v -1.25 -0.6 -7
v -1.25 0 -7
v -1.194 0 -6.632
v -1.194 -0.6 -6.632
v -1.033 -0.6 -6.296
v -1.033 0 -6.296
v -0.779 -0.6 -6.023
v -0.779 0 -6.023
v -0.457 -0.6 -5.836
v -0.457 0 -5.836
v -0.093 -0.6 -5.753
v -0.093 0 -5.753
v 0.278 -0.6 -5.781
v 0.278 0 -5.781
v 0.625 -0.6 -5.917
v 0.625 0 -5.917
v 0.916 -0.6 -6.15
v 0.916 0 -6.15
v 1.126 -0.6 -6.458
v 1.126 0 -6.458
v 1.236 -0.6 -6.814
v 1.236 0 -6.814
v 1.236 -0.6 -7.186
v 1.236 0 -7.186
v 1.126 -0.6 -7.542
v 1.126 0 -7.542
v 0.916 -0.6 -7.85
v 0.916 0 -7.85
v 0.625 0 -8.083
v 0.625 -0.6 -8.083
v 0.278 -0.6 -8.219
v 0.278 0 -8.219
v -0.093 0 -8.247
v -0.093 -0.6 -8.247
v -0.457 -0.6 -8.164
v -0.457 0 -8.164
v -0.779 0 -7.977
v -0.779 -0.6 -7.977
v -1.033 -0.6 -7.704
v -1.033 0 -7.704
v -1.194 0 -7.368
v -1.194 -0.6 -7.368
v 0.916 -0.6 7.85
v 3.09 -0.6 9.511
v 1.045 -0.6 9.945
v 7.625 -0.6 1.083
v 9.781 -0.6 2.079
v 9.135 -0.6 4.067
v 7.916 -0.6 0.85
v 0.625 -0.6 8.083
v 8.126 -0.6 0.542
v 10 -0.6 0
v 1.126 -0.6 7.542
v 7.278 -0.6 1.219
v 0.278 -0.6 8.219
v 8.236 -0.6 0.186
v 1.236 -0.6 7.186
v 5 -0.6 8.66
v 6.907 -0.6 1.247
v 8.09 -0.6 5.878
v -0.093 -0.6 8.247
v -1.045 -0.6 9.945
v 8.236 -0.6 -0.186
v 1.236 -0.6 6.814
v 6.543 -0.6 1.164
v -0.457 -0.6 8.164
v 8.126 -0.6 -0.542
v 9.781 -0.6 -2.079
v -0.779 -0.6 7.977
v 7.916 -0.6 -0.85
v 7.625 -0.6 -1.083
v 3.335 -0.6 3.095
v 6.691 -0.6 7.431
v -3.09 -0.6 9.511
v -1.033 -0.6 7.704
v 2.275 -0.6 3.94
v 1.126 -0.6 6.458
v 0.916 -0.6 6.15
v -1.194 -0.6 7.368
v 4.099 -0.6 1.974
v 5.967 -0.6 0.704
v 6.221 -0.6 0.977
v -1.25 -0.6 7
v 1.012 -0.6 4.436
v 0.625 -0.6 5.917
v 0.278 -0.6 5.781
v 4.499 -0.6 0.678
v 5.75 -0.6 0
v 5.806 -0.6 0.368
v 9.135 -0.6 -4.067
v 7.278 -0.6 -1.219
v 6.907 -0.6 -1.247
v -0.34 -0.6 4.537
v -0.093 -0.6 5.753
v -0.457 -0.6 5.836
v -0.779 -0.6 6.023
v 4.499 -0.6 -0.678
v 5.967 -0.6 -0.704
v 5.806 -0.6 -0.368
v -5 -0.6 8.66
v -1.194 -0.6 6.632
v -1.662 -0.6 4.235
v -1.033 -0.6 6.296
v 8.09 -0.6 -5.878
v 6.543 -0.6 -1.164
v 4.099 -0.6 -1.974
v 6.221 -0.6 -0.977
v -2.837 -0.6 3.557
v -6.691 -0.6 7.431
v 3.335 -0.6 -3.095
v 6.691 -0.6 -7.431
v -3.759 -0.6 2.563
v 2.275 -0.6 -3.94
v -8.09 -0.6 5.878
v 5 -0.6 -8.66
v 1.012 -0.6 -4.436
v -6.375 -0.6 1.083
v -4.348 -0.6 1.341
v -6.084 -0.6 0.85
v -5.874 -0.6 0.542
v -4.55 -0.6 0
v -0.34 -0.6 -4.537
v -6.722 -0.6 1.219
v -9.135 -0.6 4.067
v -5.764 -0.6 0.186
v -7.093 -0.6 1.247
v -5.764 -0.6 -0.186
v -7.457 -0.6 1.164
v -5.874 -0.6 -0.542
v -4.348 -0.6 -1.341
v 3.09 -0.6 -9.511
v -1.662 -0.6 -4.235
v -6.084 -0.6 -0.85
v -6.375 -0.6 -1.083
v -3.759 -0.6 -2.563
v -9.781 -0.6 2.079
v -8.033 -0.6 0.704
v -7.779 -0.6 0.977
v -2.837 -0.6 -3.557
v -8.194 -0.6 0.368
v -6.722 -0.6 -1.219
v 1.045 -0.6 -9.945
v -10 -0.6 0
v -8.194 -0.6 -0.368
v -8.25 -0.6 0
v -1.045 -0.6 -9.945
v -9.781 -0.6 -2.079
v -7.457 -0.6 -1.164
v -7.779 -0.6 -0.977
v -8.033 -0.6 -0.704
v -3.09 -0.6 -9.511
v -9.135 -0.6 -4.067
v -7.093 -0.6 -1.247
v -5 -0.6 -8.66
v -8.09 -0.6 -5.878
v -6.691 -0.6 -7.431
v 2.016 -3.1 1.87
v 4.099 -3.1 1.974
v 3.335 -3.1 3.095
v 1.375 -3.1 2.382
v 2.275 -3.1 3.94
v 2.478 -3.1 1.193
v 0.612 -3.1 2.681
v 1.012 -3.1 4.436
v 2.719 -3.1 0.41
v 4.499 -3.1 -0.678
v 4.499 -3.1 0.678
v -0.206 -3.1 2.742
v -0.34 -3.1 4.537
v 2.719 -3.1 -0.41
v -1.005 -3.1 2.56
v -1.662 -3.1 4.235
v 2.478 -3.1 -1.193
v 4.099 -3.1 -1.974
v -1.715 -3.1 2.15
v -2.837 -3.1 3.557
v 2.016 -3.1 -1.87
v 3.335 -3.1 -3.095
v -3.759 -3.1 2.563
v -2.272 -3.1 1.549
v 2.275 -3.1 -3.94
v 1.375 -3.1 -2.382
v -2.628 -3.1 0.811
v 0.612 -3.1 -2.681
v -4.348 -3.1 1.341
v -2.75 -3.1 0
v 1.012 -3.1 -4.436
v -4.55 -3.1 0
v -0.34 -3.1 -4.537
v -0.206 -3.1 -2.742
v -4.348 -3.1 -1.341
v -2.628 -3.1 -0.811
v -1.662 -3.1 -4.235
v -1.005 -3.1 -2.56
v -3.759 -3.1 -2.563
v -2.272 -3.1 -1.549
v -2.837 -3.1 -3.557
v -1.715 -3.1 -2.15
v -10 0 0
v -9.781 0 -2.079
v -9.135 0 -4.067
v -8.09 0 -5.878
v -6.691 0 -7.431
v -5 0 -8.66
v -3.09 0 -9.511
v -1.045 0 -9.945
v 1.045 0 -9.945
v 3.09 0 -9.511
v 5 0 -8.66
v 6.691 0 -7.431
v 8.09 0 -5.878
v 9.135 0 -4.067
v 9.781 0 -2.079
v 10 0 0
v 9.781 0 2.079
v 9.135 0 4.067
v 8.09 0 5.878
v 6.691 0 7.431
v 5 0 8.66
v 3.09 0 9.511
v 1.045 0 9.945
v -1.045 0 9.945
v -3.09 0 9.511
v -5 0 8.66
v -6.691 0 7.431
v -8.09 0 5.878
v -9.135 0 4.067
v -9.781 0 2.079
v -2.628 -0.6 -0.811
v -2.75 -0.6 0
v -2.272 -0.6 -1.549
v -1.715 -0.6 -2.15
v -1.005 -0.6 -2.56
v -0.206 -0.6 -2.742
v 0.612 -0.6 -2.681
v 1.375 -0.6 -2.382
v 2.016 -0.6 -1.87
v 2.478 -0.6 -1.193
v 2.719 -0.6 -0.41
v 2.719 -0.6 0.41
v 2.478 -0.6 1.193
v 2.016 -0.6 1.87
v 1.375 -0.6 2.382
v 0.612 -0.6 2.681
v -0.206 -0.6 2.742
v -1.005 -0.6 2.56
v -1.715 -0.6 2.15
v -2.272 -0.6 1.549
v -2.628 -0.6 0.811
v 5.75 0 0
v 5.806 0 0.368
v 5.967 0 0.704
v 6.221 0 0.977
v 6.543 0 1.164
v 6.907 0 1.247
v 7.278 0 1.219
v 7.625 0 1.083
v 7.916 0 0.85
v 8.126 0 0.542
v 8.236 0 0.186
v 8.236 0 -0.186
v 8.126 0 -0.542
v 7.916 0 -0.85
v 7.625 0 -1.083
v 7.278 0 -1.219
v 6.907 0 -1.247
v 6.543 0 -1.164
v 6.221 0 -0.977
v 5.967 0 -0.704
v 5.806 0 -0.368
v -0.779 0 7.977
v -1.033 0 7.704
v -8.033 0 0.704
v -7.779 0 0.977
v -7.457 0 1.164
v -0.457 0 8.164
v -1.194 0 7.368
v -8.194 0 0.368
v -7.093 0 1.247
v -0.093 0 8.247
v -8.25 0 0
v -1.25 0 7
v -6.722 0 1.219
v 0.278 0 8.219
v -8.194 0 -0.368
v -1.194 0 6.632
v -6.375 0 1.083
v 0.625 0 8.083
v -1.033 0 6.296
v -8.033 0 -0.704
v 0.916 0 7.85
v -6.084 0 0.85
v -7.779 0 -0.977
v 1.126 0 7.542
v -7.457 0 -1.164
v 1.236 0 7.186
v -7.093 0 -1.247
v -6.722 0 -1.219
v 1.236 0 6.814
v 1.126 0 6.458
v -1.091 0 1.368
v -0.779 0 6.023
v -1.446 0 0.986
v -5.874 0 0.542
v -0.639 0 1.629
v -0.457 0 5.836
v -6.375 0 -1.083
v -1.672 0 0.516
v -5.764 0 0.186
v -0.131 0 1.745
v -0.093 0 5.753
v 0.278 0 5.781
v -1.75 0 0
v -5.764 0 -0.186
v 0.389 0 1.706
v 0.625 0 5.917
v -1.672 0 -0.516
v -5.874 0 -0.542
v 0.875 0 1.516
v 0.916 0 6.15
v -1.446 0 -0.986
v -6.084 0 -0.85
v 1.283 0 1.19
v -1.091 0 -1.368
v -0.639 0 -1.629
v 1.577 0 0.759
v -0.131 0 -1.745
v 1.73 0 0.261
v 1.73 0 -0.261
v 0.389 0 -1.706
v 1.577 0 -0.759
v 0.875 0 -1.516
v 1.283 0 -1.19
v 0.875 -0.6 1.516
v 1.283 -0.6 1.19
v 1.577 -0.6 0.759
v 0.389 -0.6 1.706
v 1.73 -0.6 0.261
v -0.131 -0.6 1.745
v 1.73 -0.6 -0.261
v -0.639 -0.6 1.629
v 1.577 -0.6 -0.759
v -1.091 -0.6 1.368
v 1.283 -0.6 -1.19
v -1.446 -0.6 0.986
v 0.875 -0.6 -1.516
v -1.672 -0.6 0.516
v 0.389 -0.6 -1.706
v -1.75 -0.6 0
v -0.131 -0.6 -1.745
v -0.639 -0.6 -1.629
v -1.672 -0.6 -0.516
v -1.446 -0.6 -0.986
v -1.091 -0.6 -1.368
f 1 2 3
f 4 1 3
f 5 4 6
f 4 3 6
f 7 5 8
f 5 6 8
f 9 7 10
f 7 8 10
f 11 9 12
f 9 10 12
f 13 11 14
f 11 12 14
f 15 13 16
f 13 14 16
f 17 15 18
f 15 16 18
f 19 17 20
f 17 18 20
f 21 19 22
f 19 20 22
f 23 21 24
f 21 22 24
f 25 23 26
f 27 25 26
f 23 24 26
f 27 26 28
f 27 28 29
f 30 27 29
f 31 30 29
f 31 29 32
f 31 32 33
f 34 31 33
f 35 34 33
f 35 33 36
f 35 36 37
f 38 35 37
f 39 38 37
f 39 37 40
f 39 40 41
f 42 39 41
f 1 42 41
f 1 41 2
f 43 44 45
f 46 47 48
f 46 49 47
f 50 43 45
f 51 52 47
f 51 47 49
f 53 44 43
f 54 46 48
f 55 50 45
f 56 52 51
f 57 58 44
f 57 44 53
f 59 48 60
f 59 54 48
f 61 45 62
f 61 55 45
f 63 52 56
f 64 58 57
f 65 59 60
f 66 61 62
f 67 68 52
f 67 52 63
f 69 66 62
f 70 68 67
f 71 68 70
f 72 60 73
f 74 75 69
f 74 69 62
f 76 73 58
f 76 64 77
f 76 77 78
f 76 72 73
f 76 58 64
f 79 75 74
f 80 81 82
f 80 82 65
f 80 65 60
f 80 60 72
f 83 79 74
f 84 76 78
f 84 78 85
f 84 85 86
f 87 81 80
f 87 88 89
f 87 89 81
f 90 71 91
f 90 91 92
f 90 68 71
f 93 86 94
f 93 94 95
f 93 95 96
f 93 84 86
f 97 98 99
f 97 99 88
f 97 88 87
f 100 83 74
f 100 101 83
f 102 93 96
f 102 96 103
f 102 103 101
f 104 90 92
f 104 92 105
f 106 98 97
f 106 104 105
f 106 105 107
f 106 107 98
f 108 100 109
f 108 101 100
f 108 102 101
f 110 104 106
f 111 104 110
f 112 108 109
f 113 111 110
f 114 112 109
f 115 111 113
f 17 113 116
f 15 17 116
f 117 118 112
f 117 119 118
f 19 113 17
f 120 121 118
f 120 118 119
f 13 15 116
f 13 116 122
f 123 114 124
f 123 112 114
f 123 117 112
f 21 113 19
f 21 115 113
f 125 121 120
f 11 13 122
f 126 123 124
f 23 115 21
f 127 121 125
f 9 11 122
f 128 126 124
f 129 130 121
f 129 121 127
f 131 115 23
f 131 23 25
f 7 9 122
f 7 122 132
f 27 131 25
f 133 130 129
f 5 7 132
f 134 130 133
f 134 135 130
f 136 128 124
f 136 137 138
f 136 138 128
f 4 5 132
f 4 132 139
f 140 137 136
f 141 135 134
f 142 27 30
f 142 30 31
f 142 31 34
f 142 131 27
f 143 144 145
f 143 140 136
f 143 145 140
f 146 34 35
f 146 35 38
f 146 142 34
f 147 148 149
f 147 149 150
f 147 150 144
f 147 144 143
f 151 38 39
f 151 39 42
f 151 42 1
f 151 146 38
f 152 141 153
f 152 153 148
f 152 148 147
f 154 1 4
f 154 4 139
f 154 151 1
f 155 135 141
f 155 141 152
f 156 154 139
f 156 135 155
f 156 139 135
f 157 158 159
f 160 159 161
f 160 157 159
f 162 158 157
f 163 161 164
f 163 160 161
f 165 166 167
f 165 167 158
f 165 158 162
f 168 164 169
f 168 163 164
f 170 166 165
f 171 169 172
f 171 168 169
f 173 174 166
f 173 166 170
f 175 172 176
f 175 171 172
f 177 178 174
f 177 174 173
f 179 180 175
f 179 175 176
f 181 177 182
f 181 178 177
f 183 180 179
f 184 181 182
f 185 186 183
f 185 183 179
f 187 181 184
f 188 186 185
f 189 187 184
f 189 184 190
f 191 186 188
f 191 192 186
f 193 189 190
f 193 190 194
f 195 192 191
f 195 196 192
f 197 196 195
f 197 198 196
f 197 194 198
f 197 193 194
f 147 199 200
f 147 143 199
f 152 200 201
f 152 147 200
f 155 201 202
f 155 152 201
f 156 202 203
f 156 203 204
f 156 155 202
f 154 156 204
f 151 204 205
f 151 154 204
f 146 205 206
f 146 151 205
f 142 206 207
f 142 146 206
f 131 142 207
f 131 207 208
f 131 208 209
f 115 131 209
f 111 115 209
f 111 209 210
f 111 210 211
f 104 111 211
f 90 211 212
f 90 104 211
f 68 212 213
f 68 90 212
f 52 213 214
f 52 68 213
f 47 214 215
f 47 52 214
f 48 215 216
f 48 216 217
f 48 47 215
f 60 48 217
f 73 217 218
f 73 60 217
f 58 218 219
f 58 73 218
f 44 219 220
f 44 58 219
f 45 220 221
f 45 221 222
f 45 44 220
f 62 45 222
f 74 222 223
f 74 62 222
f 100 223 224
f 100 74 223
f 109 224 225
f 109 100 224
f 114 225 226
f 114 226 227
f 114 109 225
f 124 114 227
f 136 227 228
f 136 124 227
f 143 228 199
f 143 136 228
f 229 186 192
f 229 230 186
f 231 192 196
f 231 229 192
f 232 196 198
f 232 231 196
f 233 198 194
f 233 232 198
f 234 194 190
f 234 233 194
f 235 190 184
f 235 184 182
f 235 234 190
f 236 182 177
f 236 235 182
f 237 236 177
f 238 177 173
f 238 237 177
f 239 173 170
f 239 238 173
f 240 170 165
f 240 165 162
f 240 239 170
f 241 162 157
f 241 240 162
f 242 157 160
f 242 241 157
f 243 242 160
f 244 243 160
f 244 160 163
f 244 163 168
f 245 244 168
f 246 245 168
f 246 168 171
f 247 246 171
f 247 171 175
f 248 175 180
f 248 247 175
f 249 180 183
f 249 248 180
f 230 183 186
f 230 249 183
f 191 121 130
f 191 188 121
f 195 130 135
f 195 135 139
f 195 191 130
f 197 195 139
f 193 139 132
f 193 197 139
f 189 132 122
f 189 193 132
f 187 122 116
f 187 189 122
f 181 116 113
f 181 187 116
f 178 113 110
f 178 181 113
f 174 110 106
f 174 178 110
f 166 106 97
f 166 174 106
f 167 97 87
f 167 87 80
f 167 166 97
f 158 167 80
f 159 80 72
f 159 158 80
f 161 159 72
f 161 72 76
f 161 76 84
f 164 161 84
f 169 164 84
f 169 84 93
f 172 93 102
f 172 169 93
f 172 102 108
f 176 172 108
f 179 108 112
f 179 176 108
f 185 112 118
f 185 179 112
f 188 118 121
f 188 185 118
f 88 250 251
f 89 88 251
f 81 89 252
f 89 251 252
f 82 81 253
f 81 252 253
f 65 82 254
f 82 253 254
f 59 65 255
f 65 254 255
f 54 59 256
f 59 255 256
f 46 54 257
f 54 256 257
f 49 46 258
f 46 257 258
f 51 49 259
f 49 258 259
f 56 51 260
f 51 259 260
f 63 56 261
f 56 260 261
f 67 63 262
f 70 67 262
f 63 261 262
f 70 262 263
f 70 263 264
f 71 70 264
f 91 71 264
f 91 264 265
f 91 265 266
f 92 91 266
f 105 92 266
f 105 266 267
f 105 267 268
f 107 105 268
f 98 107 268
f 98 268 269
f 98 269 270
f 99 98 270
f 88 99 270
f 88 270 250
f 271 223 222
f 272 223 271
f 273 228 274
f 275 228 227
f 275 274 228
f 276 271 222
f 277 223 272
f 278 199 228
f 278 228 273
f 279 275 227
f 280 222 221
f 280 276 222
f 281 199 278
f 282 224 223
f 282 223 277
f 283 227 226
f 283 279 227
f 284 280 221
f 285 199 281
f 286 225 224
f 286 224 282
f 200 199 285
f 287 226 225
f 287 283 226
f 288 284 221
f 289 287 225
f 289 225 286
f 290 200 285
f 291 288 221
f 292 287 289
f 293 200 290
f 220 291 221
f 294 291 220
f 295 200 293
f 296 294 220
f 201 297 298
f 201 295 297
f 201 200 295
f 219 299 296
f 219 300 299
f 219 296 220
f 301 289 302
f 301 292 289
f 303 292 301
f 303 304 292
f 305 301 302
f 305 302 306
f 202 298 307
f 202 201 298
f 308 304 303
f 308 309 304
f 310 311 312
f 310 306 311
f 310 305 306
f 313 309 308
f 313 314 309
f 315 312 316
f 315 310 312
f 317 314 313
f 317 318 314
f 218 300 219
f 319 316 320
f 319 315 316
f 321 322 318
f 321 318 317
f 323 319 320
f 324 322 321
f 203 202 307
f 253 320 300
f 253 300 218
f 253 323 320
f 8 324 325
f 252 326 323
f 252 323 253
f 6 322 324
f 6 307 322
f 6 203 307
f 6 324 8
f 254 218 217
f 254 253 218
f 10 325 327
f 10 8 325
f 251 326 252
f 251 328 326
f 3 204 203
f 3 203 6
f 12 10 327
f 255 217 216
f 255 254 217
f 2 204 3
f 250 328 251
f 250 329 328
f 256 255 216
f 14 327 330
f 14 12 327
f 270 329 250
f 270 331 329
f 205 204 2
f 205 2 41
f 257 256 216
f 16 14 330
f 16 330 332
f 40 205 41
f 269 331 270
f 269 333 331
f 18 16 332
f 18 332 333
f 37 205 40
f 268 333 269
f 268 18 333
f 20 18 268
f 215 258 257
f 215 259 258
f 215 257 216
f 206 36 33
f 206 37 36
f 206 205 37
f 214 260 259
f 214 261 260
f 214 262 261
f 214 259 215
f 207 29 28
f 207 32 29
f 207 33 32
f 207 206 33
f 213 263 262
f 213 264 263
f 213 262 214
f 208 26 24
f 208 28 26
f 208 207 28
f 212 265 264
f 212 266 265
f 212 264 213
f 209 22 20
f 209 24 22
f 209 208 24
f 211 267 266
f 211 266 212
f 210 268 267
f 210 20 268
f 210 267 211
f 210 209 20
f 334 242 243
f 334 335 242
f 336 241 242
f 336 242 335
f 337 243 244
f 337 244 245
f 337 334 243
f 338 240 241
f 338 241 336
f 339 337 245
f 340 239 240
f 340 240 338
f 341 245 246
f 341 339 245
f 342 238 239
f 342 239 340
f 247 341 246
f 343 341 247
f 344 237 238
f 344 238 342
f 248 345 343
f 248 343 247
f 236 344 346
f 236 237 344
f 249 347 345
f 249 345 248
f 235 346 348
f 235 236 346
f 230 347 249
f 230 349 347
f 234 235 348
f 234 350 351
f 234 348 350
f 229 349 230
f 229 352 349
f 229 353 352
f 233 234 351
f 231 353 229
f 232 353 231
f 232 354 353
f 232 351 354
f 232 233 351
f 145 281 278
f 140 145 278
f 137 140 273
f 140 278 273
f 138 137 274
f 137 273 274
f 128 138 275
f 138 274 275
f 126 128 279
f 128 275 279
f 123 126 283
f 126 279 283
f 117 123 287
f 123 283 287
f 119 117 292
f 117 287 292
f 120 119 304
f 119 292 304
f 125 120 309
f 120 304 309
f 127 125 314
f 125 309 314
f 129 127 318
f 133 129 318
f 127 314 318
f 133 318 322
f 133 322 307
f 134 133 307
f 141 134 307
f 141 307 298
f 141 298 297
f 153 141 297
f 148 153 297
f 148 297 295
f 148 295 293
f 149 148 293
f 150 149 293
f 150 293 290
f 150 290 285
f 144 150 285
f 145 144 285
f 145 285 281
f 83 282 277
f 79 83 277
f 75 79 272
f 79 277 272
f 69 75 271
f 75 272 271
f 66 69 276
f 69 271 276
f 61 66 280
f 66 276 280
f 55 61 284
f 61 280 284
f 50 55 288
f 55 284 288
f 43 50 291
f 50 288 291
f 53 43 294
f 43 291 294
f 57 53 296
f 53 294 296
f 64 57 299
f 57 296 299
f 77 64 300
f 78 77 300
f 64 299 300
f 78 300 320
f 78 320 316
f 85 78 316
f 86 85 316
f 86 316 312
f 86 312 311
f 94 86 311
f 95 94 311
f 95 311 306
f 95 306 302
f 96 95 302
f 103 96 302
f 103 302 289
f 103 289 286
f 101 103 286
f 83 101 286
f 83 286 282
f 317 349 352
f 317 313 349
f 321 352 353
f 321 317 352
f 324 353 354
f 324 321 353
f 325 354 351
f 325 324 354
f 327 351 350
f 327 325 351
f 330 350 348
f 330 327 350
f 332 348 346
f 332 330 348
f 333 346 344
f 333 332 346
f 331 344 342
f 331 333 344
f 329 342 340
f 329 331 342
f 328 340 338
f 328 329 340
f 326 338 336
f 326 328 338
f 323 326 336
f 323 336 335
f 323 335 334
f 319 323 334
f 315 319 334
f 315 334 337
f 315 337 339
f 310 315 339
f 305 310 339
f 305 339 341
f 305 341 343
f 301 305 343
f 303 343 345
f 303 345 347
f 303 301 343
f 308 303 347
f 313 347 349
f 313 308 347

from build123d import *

# Parameters (mm, degrees)
SKETCH3_R          = 1.25
CUT_EXTRUDE1_DEPTH = 15.477914214


with BuildPart() as part:
    # Sketch2 → Revolve1 (revolve)
    with BuildSketch(Plane.XY, mode=Mode.PRIVATE) as revolve1_sk:
        Polygon((1.75, 0), (10, 0), (10, -0.6), (4.55, -0.6), (4.55, -3.1), (2.75, -3.1), (2.75, -0.6), (1.75, -0.6), align=None)
    revolve(revolve1_sk.sketch.rotate(Axis((0, 0, 0), (0, -1, 0)), 180), axis=Axis((0, 0, 0), (0, -1, 0)))

    # Sketch3 → Cut-Extrude1 (cut, through all)
    with BuildSketch(Plane(origin=(0, 0, 0), x_dir=(1, 0, 0), z_dir=(0, 1, 0))):
        with Locations(Location((0, 7, 0), (0, 0, 180))):
            Circle(SKETCH3_R)
        with Locations(Location((7, 0, 0), (0, 0, 180))):
            Circle(SKETCH3_R)
        with Locations(Location((0, -7, 0), (0, 0, 180))):
            Circle(SKETCH3_R)
        with Locations(Location((-7, 0, 0), (0, 0, 180))):
            Circle(SKETCH3_R)
    extrude(amount=-CUT_EXTRUDE1_DEPTH, mode=Mode.SUBTRACT)


solid = part.part
